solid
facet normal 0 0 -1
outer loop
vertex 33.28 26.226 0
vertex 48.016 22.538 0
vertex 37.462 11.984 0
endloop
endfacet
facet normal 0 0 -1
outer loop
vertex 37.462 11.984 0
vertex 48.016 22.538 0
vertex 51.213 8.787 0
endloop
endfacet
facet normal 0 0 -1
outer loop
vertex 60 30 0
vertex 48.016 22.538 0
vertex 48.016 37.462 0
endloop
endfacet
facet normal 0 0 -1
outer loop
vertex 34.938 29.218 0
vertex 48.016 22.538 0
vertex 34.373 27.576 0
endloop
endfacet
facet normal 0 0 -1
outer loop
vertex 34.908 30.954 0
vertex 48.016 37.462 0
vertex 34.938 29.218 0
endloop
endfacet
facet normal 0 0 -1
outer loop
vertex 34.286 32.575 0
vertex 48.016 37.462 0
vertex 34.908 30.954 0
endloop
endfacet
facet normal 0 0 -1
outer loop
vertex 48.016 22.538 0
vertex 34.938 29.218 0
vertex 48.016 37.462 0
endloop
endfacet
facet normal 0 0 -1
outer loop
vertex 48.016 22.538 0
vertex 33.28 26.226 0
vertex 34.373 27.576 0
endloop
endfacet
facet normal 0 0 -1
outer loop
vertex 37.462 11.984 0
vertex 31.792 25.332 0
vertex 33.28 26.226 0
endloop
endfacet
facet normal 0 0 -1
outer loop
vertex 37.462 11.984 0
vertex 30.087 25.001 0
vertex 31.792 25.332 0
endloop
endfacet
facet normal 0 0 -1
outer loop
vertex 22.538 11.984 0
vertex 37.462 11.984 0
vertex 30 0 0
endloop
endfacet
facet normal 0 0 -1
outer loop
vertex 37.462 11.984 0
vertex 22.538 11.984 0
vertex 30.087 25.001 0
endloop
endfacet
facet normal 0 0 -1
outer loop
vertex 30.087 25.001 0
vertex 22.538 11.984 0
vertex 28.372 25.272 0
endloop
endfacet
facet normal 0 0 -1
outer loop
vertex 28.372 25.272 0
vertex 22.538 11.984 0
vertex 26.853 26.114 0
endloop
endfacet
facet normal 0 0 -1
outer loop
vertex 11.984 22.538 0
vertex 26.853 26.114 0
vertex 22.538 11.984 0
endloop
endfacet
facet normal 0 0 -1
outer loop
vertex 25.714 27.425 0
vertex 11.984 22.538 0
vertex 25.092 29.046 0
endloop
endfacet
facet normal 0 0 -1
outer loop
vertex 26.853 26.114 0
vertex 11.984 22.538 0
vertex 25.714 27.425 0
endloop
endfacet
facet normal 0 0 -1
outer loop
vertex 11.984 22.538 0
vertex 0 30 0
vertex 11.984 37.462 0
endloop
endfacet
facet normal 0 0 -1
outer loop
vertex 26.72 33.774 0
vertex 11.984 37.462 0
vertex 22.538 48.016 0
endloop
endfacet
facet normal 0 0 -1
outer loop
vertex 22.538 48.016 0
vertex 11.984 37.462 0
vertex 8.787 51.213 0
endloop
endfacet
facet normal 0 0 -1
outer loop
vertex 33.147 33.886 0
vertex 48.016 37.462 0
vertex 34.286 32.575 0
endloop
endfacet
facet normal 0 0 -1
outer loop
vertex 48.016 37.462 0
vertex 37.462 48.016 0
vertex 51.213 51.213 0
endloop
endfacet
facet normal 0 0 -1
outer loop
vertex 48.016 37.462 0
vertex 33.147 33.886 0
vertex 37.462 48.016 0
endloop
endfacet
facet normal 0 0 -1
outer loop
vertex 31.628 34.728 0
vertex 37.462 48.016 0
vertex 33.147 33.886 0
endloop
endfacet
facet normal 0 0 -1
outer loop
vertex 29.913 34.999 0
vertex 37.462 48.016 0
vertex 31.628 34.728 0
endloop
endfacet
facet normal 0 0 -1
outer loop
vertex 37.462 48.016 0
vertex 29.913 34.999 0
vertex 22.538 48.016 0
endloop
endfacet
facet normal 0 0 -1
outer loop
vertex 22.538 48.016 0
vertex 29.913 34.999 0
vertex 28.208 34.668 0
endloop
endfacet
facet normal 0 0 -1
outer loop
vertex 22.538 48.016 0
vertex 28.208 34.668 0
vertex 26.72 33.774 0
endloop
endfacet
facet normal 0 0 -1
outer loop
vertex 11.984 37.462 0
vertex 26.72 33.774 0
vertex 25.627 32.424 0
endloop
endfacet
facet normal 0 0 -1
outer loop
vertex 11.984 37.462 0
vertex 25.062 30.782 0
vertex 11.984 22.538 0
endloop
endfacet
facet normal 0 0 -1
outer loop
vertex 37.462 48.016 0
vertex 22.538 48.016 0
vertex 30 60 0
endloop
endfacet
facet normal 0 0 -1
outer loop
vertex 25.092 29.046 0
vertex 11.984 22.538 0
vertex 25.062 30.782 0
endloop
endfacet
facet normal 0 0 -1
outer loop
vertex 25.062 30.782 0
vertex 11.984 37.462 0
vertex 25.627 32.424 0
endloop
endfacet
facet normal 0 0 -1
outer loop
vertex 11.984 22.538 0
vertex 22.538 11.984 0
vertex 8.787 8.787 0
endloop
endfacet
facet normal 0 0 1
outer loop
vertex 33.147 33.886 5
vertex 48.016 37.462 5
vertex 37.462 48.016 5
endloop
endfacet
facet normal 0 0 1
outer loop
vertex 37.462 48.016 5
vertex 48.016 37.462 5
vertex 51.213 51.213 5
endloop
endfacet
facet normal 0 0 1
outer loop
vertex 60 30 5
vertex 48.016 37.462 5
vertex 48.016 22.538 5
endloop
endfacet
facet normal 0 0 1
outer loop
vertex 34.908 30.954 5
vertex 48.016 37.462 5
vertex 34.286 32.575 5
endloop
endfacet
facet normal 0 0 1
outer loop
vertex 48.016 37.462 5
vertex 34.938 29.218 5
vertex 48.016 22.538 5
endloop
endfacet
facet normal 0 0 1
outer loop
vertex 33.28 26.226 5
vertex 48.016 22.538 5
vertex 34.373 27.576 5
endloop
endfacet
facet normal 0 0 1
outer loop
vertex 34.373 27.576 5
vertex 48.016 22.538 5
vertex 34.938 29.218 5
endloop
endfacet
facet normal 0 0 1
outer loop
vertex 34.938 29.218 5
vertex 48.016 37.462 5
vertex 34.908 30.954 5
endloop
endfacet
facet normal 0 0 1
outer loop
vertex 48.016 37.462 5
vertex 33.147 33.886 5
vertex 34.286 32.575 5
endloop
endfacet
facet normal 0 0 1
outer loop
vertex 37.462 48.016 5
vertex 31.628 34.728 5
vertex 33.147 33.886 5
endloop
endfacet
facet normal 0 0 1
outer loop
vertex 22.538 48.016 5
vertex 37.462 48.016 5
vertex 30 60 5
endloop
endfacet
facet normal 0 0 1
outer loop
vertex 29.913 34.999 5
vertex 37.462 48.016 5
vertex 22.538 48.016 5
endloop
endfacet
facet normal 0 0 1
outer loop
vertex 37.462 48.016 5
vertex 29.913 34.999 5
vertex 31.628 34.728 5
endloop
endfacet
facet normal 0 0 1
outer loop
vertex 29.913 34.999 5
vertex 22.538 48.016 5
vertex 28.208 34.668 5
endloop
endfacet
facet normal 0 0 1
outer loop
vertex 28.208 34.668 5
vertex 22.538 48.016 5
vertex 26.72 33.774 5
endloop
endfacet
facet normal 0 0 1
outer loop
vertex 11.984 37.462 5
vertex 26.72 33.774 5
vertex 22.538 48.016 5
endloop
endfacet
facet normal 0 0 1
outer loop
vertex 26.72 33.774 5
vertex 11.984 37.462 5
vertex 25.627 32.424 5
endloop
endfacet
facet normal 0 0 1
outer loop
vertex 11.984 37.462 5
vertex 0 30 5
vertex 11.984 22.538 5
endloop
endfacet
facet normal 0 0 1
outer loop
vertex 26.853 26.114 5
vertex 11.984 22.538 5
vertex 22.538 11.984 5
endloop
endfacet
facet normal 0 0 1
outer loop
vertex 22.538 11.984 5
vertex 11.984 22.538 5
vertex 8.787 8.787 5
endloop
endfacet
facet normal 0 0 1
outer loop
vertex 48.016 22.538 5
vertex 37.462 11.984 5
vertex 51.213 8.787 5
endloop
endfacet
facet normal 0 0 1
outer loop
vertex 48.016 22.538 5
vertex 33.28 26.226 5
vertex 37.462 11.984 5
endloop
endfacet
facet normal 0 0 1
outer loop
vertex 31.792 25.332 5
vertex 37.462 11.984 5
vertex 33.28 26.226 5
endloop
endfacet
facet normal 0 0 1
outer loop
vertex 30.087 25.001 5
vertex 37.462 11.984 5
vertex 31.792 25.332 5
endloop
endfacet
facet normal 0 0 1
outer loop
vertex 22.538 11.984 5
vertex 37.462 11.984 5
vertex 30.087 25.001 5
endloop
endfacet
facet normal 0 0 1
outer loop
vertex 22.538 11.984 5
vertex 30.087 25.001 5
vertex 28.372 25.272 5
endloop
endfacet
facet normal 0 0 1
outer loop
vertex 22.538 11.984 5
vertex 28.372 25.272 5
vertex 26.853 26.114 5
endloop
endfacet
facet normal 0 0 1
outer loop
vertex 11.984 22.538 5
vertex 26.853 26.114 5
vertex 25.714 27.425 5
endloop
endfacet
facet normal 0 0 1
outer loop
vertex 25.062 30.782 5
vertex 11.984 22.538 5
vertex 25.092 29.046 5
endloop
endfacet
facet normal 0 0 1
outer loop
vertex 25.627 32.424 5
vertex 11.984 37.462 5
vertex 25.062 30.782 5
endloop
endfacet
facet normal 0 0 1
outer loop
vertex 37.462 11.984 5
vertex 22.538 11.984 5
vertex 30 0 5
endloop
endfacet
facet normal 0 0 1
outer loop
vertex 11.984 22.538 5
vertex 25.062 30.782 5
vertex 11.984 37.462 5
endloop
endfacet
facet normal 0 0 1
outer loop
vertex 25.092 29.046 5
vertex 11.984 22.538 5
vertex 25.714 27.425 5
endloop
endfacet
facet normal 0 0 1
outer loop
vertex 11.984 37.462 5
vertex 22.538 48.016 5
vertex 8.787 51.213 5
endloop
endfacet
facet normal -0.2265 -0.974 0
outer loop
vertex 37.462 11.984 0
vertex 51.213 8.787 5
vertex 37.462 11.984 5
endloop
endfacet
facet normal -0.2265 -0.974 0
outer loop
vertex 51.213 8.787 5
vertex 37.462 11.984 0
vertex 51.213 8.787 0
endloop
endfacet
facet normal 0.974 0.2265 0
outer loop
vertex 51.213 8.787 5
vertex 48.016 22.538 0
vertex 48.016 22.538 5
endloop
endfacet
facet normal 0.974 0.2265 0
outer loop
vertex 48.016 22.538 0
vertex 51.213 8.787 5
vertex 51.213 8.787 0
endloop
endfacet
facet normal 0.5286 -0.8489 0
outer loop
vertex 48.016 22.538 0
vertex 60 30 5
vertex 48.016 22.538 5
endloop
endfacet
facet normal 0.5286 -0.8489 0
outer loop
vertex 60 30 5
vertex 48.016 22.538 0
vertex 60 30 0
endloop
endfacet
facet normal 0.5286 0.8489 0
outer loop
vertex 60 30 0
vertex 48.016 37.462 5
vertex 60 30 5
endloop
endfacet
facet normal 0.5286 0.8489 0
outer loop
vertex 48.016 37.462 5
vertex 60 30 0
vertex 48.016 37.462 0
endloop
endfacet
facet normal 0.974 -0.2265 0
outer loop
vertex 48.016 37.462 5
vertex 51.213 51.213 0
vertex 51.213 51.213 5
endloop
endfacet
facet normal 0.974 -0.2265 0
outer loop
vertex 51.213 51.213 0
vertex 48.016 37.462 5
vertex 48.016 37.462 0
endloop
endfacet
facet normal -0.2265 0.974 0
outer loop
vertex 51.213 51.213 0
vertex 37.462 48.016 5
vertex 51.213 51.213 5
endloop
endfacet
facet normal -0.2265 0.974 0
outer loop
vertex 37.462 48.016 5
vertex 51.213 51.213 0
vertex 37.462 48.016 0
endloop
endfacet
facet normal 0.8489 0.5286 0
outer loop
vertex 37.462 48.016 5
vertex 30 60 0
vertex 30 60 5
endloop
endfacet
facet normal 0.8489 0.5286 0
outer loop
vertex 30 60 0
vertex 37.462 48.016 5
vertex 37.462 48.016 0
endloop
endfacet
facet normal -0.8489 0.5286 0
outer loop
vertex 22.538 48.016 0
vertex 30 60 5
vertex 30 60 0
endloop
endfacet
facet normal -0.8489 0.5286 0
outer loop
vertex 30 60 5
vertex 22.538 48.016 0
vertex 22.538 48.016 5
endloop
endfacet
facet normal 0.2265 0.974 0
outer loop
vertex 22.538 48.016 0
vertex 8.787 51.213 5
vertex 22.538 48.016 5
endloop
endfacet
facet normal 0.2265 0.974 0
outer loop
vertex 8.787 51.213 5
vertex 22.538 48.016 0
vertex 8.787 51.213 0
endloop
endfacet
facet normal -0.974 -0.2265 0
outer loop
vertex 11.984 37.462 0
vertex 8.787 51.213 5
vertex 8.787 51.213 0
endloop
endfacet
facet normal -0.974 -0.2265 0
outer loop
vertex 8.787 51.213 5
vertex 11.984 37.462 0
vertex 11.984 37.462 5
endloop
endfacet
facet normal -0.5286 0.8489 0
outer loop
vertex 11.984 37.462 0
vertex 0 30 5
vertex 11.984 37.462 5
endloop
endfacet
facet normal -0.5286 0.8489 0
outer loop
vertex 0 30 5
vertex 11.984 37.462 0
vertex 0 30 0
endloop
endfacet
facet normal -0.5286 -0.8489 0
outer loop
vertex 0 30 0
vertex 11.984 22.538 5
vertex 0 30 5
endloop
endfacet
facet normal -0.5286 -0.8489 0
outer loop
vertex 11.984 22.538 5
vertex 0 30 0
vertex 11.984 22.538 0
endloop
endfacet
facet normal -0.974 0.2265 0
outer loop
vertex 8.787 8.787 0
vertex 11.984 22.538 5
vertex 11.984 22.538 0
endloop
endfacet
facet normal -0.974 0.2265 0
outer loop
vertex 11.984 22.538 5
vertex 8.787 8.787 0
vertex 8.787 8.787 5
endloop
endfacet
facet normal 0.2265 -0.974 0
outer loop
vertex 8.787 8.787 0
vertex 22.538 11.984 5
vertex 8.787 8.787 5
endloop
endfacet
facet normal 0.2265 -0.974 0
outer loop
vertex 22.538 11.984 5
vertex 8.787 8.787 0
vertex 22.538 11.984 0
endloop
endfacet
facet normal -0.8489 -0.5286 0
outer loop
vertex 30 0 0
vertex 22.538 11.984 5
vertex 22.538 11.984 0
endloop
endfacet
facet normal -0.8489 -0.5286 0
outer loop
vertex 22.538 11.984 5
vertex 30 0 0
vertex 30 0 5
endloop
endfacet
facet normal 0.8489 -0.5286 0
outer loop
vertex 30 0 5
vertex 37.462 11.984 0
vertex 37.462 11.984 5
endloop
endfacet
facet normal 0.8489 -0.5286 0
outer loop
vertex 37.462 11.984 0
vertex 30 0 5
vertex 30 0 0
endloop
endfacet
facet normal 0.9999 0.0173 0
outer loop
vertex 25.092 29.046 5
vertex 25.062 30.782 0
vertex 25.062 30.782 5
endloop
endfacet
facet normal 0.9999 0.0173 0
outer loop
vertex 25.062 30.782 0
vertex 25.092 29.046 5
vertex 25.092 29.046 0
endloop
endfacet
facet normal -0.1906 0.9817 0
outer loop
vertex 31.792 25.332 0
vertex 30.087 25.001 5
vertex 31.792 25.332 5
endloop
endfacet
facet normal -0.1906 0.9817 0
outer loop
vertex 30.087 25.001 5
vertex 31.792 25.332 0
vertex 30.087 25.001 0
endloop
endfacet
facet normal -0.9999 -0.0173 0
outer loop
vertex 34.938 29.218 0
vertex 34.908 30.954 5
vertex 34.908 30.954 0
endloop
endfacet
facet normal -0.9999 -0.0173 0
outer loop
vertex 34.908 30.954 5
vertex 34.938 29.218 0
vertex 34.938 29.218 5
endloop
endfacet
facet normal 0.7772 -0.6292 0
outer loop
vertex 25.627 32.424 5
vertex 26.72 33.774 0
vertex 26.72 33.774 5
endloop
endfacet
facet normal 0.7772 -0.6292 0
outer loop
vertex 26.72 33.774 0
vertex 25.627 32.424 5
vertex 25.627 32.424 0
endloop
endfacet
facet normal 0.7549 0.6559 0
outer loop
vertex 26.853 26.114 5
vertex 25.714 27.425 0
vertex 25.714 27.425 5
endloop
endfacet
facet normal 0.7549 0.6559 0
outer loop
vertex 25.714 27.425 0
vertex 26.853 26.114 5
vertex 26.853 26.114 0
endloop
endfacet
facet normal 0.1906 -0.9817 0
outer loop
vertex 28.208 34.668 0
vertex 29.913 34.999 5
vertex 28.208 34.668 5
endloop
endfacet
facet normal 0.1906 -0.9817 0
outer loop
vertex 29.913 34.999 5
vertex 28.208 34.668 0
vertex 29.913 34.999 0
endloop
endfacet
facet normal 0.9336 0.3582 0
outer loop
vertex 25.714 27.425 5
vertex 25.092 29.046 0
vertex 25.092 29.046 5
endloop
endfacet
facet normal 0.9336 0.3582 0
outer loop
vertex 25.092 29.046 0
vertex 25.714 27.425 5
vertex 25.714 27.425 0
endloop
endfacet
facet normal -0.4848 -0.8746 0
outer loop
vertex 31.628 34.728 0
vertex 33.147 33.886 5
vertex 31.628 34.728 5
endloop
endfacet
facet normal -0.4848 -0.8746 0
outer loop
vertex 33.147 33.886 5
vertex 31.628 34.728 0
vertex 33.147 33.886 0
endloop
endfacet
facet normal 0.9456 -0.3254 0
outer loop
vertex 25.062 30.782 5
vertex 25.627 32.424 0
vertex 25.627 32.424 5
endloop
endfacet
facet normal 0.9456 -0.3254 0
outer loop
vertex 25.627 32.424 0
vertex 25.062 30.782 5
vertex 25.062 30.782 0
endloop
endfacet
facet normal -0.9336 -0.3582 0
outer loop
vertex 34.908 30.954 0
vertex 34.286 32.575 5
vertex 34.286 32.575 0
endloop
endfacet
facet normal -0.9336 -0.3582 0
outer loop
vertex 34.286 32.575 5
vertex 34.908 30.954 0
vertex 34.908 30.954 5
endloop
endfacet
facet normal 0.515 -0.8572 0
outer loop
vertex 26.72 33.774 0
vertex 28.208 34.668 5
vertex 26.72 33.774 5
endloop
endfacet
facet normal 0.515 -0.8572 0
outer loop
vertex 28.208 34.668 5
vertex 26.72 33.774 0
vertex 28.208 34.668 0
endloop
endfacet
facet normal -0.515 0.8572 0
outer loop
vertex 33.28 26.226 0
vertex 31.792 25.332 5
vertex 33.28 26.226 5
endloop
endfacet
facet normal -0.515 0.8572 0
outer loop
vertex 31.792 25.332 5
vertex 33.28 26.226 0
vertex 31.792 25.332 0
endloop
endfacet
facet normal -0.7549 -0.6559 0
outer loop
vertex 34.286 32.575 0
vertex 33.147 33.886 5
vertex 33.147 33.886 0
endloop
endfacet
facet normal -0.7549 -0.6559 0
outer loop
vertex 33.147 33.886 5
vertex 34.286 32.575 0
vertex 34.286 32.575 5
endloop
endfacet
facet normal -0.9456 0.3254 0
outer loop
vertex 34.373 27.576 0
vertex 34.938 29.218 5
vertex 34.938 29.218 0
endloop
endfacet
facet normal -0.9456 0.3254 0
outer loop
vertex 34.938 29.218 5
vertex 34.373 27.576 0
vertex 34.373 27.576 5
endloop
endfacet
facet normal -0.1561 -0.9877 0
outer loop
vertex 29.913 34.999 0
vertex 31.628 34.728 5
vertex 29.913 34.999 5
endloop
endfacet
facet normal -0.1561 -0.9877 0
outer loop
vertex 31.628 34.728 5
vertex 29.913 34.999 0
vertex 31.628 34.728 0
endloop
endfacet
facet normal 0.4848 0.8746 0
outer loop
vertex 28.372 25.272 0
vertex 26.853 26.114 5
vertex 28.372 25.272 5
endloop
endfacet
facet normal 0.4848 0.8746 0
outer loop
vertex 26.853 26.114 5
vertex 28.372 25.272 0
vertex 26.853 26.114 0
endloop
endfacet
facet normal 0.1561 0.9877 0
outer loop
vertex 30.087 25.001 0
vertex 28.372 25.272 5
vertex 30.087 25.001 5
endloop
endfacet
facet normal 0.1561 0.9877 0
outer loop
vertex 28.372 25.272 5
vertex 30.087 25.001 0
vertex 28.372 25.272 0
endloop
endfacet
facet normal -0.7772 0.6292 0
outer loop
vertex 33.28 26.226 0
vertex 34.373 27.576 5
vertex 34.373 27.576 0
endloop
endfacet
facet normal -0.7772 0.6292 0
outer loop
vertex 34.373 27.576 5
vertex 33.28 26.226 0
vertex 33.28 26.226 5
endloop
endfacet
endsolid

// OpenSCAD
$fn = 32;

// ----------------------------------------------------------------------
// Star wheel: 8-point blunt, R30
// ----------------------------------------------------------------------

// --- parameters (mm) ---
n_points = 8;             // number of points / teeth
r_out = 30;               // tip radius
r_in = 19.5;              // root radius
bore_r = 5;               // centre bore radius
plate_t = 5;              // plate thickness, Z (extrusion height)
bore_d = 10;              // centre bore diameter
fit_tol = 0.05;           // declared fit tolerance (prompt contract)
free_tol = 0.3;           // declared free tolerance (prompt contract)

profile = [[60, 30], [48.016, 37.462], [51.213, 51.213], [37.462, 48.016], [30, 60], [22.538, 48.016], [8.787, 51.213], [11.984, 37.462], [0, 30], [11.984, 22.538], [8.787, 8.787], [22.538, 11.984], [30, 0], [37.462, 11.984], [51.213, 8.787], [48.016, 22.538]];  // primary outline, 16 points, counter clockwise
void_1 = [[34.908, 30.954], [34.286, 32.575], [33.147, 33.886], [31.628, 34.728], [29.913, 34.999], [28.208, 34.668], [26.72, 33.774], [25.627, 32.424], [25.062, 30.782], [25.092, 29.046], [25.714, 27.425], [26.853, 26.114], [28.372, 25.272], [30.087, 25.001], [31.792, 25.332], [33.28, 26.226], [34.373, 27.576], [34.938, 29.218]];  // centre bore, 18 points

// --- the one profile operation ---
difference() {
  linear_extrude(height = plate_t) polygon(points = profile);
  translate([0, 0, -1])
    linear_extrude(height = plate_t + 2) polygon(points = void_1);
}
